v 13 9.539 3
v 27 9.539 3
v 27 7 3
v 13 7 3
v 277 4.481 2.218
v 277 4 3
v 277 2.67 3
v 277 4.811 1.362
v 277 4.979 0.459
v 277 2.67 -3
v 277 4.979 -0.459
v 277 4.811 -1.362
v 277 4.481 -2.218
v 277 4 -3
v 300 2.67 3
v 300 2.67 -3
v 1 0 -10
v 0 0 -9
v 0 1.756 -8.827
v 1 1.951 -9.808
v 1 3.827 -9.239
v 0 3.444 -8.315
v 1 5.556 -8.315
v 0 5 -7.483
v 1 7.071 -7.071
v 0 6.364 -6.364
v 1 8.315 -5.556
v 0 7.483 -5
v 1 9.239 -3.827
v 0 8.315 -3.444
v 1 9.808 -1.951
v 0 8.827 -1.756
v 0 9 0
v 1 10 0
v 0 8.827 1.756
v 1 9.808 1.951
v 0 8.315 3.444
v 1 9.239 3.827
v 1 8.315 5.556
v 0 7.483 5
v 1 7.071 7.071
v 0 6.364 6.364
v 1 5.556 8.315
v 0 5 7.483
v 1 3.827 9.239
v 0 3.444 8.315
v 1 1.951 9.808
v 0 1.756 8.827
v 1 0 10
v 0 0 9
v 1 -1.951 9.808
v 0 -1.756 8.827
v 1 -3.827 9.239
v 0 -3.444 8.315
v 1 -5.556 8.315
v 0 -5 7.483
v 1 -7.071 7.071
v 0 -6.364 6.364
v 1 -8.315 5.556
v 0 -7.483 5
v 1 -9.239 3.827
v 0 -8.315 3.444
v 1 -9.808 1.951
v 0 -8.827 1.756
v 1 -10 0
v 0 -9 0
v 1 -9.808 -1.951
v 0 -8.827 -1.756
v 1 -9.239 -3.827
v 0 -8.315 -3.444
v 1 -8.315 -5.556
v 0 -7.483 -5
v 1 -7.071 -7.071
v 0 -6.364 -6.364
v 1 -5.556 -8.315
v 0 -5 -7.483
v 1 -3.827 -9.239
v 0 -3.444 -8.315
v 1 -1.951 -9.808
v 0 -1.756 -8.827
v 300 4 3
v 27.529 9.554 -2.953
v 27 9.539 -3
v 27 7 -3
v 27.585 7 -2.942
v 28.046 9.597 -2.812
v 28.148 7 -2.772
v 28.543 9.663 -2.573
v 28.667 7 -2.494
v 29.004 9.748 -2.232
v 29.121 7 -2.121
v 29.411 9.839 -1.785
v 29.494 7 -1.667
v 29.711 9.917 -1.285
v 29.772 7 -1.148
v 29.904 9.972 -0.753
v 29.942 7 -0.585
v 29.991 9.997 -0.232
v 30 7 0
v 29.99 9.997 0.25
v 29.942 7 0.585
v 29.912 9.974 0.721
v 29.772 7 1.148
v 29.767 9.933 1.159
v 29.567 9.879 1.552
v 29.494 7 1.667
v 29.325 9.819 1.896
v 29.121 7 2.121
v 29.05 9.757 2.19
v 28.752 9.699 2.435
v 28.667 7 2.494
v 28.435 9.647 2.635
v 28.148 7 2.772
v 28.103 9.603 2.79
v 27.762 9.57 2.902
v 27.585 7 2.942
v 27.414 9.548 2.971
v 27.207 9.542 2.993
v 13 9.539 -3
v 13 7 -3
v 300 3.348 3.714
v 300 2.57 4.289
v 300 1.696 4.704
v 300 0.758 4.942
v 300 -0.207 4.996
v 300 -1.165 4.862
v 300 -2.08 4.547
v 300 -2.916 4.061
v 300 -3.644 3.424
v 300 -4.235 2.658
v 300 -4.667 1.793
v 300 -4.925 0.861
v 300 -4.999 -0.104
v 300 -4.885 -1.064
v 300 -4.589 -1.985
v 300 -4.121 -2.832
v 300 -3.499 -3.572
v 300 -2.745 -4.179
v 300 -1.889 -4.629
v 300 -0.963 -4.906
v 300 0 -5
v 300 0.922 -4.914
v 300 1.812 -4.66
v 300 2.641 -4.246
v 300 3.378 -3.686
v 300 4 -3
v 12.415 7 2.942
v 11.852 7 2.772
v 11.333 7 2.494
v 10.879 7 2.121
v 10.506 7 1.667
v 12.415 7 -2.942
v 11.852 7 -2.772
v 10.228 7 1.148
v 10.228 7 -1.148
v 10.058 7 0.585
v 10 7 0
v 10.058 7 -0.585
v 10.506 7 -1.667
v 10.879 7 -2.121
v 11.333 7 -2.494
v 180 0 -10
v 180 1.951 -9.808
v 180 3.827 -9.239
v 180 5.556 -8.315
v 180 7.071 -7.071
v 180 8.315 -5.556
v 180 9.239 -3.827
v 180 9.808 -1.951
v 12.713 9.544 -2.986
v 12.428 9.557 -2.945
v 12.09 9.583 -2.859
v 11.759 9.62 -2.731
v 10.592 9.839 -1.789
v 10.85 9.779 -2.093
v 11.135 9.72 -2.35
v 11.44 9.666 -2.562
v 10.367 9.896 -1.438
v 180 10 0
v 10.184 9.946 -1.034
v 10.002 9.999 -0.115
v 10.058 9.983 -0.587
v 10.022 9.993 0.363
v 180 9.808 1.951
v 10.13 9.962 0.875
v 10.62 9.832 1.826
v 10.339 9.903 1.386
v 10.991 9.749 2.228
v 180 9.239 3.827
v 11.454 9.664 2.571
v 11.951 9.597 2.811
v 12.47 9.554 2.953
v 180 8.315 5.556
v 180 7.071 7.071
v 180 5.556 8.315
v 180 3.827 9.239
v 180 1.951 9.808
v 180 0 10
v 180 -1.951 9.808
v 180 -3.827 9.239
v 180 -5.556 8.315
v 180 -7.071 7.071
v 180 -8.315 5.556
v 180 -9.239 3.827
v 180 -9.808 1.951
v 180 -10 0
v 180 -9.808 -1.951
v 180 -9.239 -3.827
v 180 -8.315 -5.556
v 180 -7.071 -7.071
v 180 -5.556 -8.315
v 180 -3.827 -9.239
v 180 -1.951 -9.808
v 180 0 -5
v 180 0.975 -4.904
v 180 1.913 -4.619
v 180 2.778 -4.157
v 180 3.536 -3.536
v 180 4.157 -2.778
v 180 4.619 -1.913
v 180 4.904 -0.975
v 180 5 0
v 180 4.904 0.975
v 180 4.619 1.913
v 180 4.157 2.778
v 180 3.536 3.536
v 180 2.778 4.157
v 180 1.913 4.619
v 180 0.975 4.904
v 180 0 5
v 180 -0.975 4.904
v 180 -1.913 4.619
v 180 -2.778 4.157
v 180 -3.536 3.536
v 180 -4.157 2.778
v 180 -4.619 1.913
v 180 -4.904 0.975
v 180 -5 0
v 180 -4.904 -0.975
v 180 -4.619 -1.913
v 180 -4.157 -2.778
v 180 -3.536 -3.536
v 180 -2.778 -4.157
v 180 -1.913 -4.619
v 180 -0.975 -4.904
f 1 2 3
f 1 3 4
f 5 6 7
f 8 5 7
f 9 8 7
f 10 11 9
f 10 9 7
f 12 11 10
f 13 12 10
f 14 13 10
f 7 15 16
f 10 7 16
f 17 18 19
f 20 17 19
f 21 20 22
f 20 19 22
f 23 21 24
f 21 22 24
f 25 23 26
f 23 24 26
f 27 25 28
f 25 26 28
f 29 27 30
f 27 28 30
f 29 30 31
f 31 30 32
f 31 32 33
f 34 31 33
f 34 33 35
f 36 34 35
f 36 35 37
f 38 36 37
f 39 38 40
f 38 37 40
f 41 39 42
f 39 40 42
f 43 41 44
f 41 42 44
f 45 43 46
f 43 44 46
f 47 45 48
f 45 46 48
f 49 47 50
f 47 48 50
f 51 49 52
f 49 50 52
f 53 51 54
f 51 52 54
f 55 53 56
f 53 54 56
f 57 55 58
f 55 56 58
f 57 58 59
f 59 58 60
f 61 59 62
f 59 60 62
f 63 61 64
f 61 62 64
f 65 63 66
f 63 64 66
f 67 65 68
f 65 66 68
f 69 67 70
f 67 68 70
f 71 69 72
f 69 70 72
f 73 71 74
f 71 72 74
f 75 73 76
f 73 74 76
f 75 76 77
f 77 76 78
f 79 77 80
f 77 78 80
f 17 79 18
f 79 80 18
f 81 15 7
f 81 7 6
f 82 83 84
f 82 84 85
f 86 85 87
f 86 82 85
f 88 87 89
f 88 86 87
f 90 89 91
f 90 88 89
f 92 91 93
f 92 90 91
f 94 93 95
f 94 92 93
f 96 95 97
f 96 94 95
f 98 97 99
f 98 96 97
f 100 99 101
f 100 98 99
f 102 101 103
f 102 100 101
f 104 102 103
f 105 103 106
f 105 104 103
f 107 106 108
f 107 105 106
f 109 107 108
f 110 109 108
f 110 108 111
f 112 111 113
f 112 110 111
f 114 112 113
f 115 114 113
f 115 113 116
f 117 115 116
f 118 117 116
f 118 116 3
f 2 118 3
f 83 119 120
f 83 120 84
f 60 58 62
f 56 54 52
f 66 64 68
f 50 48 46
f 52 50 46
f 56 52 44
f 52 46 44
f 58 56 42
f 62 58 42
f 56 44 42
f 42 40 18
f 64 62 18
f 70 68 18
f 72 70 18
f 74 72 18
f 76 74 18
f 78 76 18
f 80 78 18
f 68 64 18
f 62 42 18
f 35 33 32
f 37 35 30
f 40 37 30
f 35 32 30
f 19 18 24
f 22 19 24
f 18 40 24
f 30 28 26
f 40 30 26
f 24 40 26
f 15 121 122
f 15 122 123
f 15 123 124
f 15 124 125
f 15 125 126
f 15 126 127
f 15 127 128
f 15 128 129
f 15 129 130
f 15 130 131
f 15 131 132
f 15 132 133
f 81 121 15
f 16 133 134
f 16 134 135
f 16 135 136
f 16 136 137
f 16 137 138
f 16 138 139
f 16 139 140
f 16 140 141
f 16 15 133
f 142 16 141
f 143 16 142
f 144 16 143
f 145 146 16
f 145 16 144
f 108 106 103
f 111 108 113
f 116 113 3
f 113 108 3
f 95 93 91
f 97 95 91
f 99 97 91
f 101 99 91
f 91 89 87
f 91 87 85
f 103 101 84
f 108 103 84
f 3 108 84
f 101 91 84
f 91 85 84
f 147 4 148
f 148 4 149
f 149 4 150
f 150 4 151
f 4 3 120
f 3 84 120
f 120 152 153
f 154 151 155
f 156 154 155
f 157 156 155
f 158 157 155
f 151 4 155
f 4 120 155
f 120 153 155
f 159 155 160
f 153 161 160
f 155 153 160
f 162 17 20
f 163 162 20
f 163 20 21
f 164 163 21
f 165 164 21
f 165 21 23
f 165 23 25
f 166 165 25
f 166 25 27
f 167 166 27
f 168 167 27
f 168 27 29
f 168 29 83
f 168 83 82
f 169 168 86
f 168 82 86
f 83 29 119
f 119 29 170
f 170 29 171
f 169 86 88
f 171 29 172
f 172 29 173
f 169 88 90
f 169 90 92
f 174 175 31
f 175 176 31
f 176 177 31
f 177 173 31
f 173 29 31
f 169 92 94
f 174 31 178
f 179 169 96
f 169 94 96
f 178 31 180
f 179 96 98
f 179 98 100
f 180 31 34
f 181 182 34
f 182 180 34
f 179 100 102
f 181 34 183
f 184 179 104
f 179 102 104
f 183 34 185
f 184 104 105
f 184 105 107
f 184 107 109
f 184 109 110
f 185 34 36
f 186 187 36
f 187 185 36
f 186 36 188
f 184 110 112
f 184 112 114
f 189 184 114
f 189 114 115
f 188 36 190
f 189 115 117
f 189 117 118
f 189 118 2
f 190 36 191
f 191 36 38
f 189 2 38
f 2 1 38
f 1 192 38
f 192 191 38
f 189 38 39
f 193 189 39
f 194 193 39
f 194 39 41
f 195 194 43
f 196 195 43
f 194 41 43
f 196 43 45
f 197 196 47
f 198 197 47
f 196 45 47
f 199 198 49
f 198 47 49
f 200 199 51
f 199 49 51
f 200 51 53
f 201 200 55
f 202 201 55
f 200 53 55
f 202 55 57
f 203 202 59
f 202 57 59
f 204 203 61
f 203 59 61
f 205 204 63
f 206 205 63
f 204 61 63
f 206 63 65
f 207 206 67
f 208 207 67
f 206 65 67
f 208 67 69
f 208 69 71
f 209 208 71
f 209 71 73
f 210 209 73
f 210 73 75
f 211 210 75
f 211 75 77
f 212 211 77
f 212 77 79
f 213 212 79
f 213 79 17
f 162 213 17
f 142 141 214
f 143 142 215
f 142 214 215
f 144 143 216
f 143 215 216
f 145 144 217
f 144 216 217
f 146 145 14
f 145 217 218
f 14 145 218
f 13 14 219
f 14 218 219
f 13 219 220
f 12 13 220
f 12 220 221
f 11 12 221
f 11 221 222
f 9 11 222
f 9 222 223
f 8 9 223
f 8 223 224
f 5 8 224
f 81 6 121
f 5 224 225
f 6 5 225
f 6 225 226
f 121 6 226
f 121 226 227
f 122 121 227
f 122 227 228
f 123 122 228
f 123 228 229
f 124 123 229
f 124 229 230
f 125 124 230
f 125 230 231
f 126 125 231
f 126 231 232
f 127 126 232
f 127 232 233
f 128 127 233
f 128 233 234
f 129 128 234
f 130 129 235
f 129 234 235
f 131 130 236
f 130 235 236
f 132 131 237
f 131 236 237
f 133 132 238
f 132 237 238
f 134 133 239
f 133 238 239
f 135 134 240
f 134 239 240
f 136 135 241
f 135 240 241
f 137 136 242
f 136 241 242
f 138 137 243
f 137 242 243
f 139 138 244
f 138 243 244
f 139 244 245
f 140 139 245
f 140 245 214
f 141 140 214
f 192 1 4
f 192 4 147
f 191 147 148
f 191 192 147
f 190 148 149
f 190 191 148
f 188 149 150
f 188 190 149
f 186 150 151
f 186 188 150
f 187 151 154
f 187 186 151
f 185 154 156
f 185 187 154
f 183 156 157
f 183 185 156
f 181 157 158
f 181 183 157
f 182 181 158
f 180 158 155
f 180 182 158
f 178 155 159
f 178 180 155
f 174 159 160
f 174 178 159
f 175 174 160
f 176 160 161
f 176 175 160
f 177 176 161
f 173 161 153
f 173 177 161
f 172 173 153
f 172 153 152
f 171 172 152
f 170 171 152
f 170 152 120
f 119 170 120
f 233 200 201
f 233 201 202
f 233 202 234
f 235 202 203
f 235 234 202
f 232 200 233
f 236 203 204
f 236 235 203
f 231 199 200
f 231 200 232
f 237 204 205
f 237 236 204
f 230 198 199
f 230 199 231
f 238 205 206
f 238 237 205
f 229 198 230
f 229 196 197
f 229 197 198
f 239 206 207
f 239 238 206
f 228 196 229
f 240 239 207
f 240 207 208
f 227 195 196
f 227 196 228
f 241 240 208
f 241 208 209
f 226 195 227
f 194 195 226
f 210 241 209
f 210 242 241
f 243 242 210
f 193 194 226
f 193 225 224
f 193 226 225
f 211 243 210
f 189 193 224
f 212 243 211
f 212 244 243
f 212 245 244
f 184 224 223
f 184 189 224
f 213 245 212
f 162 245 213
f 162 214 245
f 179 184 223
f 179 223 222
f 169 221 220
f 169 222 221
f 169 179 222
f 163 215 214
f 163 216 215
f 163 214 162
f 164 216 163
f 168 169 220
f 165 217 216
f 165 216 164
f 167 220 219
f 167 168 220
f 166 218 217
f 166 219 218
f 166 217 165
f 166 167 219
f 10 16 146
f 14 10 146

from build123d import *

# Parameters (mm, degrees)
SKETCH_1_R          = 10
EXTRUDE_1_DEPTH     = 150
CUT_EXTRUDE_1_DEPTH = 3
CHAMFER_1_SIZE      = 1
SKETCH_3_R          = 10
EXTRUDE_2_DEPTH     = 150
CUT_EXTRUDE_2_DEPTH = 3
CHAMFER_2_SIZE      = 1
CUT_EXTRUDE_START   = -120
SKETCH_5_R          = 10
SKETCH_5_R_2        = 5
CUT_EXTRUDE_3_DEPTH = 120
SKETCH_6_W          = 6
SKETCH_6_H          = 4.078010131
CUT_EXTRUDE_4_DEPTH = 23


with BuildPart() as part:
    # 草图1 → 凸台-拉伸1 (new body)
    with BuildSketch(Plane(origin=(0, 0, 0), x_dir=(0, 0, -1), z_dir=(1, 0, 0))):
        Circle(SKETCH_1_R)
    extrude(amount=EXTRUDE_1_DEPTH)

    # 草图2 → 切除-拉伸1 (cut)
    with BuildSketch(Plane(origin=(0, 10, 0), x_dir=(1, 0, 0), z_dir=(0, 1, 0))):
        with BuildLine():
            Line((13, 3), (27, 3))
            ThreePointArc((27, 3), (30, 0), (27, -3))
            Line((27, -3), (13, -3))
            ThreePointArc((13, -3), (10, 0), (13, 3))
        make_face()
    extrude(amount=-CUT_EXTRUDE_1_DEPTH, mode=Mode.SUBTRACT)

    # 倒角1
    chamfer_1_edges = [part.edges().sort_by_distance(p)[0] for p in [
        (0, 0, 10),
    ]]
    chamfer(chamfer_1_edges, length=CHAMFER_1_SIZE)

    # 草图3 → 凸台-拉伸2 (add)
    with BuildSketch(Plane(origin=(150, 0, 0), x_dir=(0, 0, -1), z_dir=(1, 0, 0))):
        Circle(SKETCH_3_R)
    extrude(amount=EXTRUDE_2_DEPTH)

    # 草图4 → 切除-拉伸2 (cut)
    with BuildSketch(Plane(origin=(0, 10, 0), x_dir=(1, 0, 0), z_dir=(0, 1, 0))):
        with BuildLine():
            Line((273, 3), (287, 3))
            ThreePointArc((287, 3), (290, 0), (287, -3))
            Line((287, -3), (273, -3))
            ThreePointArc((273, -3), (270, 0), (273, 3))
        make_face()
    extrude(amount=-CUT_EXTRUDE_2_DEPTH, mode=Mode.SUBTRACT)

    # 倒角2
    chamfer_2_edges = [part.edges().sort_by_distance(p)[0] for p in [
        (300, 0, 10),
    ]]
    chamfer(chamfer_2_edges, length=CHAMFER_2_SIZE)

    # 草图5 → 切除-拉伸3 (cut)
    with BuildSketch(Plane(origin=(300, 0, 0), x_dir=(0, 0, -1), z_dir=(1, 0, 0)).offset(CUT_EXTRUDE_START)):
        Circle(SKETCH_5_R)
        Circle(SKETCH_5_R_2, mode=Mode.SUBTRACT)
    extrude(amount=CUT_EXTRUDE_3_DEPTH, mode=Mode.SUBTRACT)

    # 草图6 → 切除-拉伸4 (cut)
    with BuildSketch(Plane(origin=(300, 0, 0), x_dir=(0, 0, -1), z_dir=(1, 0, 0))):
        with Locations((0, 4.709450104)):
            Rectangle(SKETCH_6_W, SKETCH_6_H)
    extrude(amount=-CUT_EXTRUDE_4_DEPTH, mode=Mode.SUBTRACT)


solid = part.part
